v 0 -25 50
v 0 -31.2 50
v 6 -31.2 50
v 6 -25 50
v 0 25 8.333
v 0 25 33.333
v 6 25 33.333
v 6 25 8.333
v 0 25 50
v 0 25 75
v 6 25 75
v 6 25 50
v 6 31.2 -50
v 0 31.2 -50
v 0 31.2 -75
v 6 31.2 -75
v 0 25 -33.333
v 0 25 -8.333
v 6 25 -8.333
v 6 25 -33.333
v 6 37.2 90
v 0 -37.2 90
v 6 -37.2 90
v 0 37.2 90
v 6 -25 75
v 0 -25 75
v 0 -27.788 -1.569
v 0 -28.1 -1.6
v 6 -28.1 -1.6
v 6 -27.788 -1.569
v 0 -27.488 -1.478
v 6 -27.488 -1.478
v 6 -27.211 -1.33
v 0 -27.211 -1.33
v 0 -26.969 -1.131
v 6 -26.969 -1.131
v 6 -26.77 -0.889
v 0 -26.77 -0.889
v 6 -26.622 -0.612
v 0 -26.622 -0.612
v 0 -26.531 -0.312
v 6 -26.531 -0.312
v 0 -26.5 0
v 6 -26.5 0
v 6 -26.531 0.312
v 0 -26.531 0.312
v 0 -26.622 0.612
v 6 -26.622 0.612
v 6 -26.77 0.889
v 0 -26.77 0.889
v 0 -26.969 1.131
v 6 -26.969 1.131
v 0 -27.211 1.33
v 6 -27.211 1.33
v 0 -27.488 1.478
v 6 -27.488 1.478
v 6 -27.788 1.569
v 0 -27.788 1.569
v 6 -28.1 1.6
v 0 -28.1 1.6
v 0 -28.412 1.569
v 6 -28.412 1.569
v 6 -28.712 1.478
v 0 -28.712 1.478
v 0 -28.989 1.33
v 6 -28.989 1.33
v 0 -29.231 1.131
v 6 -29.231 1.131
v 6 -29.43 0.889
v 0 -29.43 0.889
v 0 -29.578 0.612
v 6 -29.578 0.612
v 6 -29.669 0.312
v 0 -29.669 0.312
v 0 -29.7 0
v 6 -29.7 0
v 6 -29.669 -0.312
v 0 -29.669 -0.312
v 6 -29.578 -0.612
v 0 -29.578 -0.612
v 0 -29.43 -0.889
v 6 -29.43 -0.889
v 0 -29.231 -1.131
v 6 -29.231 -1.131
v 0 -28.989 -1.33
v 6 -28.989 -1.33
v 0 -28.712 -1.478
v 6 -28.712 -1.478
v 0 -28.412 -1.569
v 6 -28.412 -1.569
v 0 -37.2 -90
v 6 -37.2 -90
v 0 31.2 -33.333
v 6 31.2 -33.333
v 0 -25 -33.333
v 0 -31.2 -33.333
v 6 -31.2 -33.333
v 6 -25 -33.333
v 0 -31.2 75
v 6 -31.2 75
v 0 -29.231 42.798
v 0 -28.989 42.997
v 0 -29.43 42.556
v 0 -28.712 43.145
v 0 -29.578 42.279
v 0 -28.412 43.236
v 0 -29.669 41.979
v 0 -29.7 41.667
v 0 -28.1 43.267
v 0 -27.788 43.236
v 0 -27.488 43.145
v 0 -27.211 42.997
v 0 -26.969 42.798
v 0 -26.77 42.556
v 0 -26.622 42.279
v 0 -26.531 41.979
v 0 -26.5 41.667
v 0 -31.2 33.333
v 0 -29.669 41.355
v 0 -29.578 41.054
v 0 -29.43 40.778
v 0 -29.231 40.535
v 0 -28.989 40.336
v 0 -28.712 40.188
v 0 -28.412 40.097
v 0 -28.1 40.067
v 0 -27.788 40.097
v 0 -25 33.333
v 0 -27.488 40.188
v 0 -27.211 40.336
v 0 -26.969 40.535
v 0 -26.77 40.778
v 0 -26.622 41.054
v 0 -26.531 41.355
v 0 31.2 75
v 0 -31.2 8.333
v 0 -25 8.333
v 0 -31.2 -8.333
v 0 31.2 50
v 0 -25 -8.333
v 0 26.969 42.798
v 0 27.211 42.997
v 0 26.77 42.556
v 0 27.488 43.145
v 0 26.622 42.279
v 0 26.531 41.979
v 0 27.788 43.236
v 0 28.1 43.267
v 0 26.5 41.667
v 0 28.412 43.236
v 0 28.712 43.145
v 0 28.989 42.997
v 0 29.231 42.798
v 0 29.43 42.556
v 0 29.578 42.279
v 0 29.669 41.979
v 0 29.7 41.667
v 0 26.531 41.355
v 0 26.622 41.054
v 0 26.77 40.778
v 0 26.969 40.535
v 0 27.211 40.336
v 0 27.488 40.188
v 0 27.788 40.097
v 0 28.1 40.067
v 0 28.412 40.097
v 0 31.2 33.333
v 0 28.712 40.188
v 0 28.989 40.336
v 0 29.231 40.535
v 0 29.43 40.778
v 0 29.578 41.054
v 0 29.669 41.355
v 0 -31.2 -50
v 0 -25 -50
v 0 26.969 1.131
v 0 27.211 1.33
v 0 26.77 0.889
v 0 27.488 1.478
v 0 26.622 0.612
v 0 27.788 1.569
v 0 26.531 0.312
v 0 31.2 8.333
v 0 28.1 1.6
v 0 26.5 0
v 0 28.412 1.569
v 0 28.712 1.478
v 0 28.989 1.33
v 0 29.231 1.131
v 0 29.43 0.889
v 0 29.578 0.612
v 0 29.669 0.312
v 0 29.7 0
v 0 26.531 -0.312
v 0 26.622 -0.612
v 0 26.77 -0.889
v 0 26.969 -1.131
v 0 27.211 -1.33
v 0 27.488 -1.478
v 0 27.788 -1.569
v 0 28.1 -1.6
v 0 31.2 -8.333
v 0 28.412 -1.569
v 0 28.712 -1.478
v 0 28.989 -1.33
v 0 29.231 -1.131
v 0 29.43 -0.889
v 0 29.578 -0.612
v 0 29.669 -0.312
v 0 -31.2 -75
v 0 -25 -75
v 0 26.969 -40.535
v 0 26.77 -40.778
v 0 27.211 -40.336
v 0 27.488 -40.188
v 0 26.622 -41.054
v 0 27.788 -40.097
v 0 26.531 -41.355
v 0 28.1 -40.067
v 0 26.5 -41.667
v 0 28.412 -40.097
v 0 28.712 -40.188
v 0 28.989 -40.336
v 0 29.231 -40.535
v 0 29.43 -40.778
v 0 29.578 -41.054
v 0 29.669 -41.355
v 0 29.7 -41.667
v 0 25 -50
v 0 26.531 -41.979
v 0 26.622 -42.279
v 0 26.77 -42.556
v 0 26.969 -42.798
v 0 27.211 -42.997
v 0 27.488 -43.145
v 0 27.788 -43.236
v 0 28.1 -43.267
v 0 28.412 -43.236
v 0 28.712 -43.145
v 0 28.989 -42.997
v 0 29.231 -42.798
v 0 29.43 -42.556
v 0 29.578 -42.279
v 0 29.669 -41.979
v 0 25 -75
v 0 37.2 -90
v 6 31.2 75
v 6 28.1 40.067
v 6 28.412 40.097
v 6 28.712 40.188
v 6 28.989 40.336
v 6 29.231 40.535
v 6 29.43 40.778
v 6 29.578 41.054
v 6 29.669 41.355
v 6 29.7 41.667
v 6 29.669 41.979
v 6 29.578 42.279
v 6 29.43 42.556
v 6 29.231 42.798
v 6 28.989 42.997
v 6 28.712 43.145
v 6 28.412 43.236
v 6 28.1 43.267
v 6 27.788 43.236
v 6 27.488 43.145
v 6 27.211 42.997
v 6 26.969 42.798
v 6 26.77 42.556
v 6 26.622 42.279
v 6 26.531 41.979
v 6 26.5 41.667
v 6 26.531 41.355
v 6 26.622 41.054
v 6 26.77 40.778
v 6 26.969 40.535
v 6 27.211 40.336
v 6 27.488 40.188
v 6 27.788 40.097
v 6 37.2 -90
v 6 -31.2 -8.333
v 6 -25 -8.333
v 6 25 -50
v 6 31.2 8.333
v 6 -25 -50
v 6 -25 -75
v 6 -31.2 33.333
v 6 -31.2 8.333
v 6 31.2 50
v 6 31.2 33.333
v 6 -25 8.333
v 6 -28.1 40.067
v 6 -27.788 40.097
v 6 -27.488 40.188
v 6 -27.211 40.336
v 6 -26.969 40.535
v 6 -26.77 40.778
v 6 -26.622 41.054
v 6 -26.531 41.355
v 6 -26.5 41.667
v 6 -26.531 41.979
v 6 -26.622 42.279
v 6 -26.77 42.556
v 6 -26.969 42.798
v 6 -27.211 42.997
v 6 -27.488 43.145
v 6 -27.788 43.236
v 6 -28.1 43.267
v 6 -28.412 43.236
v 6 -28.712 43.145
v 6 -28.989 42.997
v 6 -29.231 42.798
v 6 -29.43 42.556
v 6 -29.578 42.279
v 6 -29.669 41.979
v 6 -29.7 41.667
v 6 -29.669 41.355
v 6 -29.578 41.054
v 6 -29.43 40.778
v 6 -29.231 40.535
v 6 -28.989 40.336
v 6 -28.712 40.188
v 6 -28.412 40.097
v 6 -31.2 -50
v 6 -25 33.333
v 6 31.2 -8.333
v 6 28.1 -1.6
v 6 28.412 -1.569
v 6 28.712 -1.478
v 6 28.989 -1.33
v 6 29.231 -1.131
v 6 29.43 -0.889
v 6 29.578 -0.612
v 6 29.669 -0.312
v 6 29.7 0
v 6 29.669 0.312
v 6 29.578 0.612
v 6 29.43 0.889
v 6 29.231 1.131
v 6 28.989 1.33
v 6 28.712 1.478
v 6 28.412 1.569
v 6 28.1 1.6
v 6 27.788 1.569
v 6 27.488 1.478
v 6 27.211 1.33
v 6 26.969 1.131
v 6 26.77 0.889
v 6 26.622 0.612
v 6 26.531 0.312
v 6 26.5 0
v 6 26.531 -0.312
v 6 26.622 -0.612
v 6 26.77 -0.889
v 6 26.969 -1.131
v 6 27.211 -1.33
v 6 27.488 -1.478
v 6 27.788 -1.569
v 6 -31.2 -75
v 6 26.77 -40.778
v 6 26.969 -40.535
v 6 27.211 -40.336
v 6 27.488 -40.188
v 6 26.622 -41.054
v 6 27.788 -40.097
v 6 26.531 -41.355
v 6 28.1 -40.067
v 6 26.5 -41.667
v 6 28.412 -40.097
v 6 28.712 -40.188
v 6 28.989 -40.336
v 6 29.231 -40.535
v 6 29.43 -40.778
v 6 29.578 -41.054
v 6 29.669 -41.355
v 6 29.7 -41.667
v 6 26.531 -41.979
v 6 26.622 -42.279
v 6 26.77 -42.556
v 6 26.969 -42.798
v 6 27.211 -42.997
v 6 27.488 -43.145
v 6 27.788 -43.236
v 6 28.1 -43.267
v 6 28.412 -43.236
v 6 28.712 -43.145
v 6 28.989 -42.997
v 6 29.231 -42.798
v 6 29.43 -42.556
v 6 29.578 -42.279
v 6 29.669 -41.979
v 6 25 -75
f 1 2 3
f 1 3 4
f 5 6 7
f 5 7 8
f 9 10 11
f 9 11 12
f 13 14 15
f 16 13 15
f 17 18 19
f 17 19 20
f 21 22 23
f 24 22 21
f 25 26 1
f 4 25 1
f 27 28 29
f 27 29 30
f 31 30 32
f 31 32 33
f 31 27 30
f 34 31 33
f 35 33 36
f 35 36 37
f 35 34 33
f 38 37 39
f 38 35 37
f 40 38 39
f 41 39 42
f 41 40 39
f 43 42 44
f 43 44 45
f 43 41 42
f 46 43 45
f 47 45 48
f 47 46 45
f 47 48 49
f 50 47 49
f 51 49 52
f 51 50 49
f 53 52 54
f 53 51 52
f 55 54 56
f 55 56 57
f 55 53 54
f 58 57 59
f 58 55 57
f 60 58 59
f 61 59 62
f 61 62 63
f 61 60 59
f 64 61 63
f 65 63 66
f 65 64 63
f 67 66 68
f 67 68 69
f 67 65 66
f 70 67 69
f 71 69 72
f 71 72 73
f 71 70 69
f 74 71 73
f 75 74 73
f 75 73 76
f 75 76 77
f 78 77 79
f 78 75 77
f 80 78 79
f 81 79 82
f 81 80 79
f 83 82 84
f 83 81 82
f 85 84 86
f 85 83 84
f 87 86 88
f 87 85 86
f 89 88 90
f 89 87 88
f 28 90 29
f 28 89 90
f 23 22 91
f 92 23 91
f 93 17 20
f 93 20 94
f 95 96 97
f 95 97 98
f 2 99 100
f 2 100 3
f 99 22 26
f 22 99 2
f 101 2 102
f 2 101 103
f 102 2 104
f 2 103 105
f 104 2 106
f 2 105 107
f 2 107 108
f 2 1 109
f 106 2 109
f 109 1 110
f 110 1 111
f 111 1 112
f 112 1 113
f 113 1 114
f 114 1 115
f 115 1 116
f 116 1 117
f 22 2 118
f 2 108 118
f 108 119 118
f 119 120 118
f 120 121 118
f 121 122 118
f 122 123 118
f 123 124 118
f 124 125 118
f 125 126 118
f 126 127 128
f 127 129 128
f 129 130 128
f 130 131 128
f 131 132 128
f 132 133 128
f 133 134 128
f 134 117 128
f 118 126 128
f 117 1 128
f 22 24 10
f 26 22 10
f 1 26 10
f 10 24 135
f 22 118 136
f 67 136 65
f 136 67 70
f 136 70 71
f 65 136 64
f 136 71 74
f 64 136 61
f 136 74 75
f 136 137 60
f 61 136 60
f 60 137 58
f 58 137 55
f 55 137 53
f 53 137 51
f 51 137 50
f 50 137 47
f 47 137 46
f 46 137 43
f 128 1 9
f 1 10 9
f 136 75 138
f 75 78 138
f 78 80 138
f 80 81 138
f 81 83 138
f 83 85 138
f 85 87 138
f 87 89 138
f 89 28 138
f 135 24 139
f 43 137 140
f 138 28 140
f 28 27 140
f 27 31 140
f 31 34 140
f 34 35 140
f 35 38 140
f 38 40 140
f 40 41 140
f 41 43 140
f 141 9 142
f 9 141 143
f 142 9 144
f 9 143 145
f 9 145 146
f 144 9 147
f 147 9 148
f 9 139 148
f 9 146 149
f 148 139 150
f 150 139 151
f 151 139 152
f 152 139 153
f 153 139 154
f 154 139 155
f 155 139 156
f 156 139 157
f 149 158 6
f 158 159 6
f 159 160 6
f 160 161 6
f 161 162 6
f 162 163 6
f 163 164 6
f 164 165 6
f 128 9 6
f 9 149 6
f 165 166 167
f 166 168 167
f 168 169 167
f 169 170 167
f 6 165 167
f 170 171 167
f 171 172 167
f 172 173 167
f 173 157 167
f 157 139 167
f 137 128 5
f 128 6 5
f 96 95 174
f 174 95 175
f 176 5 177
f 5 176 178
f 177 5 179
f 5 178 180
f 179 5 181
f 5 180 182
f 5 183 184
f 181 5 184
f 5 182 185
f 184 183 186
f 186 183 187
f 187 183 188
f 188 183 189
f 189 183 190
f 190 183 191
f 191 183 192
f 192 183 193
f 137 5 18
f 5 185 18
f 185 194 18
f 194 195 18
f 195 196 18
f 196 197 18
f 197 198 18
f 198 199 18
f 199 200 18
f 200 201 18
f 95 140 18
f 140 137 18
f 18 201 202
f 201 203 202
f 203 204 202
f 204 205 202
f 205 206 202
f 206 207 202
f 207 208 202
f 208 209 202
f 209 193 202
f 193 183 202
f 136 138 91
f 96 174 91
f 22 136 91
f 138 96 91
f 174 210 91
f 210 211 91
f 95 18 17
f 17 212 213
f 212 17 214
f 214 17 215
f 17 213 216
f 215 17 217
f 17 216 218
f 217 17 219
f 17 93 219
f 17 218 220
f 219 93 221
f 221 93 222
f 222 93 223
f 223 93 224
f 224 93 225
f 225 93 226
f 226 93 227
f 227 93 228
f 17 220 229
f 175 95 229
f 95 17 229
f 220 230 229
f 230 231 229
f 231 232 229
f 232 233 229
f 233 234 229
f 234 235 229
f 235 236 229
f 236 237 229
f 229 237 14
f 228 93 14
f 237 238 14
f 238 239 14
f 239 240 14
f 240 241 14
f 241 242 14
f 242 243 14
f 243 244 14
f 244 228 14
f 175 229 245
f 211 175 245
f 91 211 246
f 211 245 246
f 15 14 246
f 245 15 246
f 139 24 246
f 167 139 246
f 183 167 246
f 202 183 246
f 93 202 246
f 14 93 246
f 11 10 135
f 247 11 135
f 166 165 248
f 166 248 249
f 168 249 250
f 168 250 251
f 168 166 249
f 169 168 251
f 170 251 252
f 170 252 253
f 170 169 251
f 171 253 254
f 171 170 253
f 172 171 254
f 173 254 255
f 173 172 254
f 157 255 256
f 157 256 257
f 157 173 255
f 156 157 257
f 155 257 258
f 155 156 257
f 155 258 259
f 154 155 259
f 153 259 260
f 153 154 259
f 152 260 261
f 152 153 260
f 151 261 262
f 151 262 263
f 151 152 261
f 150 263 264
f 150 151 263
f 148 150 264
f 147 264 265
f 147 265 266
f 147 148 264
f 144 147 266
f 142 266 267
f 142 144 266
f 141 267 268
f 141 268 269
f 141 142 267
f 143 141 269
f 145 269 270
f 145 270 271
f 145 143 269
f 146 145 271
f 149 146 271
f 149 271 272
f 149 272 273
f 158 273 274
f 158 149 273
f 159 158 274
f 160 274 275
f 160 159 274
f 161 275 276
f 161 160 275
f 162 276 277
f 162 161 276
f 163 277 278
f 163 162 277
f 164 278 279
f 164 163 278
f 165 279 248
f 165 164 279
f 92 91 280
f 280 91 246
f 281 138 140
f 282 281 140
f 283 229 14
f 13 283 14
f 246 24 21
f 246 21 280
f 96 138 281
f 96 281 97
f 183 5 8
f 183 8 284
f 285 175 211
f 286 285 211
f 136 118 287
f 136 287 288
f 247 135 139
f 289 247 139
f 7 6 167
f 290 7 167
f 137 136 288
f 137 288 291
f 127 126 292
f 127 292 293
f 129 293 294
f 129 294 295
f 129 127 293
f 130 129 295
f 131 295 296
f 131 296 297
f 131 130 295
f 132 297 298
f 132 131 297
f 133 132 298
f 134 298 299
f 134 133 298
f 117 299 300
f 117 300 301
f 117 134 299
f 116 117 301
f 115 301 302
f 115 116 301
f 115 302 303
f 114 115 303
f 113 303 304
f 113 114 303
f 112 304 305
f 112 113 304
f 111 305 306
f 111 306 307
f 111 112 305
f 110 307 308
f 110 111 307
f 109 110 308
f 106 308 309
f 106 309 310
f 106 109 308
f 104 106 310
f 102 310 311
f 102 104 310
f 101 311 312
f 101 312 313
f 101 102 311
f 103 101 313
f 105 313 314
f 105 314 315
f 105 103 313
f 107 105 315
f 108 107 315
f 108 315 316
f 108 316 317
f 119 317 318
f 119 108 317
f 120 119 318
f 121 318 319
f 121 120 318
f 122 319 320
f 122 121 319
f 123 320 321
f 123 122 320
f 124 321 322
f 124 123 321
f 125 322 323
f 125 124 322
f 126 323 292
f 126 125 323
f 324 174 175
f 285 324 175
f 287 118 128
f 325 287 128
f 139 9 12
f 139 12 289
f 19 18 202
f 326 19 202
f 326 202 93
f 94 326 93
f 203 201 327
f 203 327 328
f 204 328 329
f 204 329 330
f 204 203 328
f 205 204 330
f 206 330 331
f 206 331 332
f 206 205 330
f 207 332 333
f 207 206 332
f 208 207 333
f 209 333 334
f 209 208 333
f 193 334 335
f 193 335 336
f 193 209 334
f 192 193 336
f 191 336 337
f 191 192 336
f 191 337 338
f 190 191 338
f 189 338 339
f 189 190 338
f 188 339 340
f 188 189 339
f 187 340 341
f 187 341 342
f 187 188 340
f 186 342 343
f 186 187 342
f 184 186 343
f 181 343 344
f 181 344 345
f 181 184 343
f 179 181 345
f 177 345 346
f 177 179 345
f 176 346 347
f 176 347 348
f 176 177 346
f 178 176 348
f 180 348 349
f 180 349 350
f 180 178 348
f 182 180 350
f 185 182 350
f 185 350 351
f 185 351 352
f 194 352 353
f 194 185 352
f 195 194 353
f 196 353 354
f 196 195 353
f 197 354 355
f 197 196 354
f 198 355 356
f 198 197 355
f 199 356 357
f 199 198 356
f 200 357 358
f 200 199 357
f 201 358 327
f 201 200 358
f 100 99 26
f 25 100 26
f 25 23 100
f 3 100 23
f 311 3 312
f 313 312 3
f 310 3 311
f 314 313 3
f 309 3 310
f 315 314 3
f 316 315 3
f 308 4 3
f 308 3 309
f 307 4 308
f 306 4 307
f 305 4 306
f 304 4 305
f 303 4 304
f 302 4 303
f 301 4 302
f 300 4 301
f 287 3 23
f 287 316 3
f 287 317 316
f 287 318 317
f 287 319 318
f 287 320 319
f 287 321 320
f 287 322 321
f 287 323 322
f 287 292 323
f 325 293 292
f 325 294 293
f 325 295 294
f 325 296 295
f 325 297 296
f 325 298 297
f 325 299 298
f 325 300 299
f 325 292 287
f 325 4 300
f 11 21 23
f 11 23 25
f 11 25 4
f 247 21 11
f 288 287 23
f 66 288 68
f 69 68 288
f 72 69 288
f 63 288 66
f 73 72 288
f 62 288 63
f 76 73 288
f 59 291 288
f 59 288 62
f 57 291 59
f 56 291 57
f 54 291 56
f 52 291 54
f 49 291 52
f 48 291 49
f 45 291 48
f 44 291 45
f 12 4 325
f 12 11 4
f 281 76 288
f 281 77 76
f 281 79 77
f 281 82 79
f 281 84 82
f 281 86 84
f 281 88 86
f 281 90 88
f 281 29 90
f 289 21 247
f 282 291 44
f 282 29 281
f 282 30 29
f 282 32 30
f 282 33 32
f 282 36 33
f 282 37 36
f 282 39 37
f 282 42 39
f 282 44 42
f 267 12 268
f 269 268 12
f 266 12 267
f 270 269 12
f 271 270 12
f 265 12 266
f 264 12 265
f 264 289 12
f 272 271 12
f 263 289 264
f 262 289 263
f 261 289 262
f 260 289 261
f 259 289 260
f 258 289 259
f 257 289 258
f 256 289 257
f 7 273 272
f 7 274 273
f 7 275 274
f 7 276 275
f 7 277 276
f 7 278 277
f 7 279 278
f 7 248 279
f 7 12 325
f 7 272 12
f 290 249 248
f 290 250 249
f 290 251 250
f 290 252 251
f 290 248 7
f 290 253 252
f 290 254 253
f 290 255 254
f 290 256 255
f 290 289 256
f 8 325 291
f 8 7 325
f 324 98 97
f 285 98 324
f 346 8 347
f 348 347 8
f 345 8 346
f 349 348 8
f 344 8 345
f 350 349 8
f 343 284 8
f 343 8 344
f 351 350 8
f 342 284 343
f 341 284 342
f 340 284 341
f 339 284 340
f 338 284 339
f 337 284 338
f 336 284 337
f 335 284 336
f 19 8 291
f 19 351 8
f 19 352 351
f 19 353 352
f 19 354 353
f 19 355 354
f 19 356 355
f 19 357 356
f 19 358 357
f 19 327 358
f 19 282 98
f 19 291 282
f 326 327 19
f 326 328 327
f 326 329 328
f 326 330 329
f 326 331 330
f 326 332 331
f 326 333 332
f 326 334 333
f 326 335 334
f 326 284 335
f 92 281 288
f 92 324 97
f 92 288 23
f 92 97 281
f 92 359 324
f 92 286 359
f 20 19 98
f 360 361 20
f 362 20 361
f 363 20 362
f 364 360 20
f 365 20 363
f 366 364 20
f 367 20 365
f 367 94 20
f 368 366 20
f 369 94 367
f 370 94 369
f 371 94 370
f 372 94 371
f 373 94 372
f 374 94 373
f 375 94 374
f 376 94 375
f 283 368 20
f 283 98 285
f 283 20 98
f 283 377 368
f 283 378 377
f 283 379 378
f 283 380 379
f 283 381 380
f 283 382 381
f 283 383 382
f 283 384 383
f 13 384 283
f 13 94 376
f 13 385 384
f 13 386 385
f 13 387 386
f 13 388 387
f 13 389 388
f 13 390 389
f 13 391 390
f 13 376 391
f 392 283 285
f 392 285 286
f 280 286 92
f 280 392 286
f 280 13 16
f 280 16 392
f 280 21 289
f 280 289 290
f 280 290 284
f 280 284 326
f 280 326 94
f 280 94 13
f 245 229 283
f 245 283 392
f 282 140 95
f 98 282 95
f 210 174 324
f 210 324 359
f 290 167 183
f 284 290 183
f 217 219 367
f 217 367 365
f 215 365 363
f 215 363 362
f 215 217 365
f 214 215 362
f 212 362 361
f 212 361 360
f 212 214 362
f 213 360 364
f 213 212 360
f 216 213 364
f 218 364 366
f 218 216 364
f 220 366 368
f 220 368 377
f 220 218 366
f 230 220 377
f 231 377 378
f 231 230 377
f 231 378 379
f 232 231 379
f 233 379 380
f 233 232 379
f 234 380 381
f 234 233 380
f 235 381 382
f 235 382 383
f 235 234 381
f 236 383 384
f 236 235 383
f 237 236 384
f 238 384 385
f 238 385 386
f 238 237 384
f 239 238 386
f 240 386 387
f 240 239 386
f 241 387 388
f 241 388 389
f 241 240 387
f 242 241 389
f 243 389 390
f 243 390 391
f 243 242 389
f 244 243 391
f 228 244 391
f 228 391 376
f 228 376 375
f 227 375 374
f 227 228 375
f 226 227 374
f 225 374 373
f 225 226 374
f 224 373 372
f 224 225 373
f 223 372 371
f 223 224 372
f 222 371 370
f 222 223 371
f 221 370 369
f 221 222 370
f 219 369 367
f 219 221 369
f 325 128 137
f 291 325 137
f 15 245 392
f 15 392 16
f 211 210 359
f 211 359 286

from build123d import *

# Parameters (mm, degrees)
SKETCH1_W           = 180
SKETCH1_H           = 74.4
SKETCH1_R           = 1.6
SKETCH1_W_2         = 25
SKETCH1_H_2         = 6.2
BOSS_EXTRUDE1_DEPTH = 6


with BuildPart() as part:
    # Sketch1 → Boss-Extrude1 (new body)
    with BuildSketch(Plane(origin=(0, 0, 0), x_dir=(0, 0, -1), z_dir=(1, 0, 0))):
        Rectangle(SKETCH1_W, SKETCH1_H)
        with Locations((-41.666666667, -28.1)):
            Circle(SKETCH1_R, mode=Mode.SUBTRACT)
        with Locations((0, -28.1)):
            Circle(SKETCH1_R, mode=Mode.SUBTRACT)
        with Locations((-41.666666667, 28.1)):
            Circle(SKETCH1_R, mode=Mode.SUBTRACT)
        with Locations((0, 28.1)):
            Circle(SKETCH1_R, mode=Mode.SUBTRACT)
        with Locations(Location((41.666666667, 28.1, 0), (0, 0, 180))):
            Circle(SKETCH1_R, mode=Mode.SUBTRACT)
        with Locations((-20.833333333, -28.1)):
            Rectangle(SKETCH1_W_2, SKETCH1_H_2, mode=Mode.SUBTRACT)
        with Locations((-62.5, -28.1)):
            Rectangle(SKETCH1_W_2, SKETCH1_H_2, mode=Mode.SUBTRACT)
        with Locations((20.833333333, -28.1)):
            Rectangle(SKETCH1_W_2, SKETCH1_H_2, mode=Mode.SUBTRACT)
        with Locations((62.5, -28.1)):
            Rectangle(SKETCH1_W_2, SKETCH1_H_2, mode=Mode.SUBTRACT)
        with Locations((-62.5, 28.1)):
            Rectangle(SKETCH1_W_2, SKETCH1_H_2, mode=Mode.SUBTRACT)
        with Locations((-20.833333333, 28.1)):
            Rectangle(SKETCH1_W_2, SKETCH1_H_2, mode=Mode.SUBTRACT)
        with Locations((20.833333333, 28.1)):
            Rectangle(SKETCH1_W_2, SKETCH1_H_2, mode=Mode.SUBTRACT)
        with Locations((62.5, 28.1)):
            Rectangle(SKETCH1_W_2, SKETCH1_H_2, mode=Mode.SUBTRACT)
    extrude(amount=BOSS_EXTRUDE1_DEPTH)


solid = part.part
